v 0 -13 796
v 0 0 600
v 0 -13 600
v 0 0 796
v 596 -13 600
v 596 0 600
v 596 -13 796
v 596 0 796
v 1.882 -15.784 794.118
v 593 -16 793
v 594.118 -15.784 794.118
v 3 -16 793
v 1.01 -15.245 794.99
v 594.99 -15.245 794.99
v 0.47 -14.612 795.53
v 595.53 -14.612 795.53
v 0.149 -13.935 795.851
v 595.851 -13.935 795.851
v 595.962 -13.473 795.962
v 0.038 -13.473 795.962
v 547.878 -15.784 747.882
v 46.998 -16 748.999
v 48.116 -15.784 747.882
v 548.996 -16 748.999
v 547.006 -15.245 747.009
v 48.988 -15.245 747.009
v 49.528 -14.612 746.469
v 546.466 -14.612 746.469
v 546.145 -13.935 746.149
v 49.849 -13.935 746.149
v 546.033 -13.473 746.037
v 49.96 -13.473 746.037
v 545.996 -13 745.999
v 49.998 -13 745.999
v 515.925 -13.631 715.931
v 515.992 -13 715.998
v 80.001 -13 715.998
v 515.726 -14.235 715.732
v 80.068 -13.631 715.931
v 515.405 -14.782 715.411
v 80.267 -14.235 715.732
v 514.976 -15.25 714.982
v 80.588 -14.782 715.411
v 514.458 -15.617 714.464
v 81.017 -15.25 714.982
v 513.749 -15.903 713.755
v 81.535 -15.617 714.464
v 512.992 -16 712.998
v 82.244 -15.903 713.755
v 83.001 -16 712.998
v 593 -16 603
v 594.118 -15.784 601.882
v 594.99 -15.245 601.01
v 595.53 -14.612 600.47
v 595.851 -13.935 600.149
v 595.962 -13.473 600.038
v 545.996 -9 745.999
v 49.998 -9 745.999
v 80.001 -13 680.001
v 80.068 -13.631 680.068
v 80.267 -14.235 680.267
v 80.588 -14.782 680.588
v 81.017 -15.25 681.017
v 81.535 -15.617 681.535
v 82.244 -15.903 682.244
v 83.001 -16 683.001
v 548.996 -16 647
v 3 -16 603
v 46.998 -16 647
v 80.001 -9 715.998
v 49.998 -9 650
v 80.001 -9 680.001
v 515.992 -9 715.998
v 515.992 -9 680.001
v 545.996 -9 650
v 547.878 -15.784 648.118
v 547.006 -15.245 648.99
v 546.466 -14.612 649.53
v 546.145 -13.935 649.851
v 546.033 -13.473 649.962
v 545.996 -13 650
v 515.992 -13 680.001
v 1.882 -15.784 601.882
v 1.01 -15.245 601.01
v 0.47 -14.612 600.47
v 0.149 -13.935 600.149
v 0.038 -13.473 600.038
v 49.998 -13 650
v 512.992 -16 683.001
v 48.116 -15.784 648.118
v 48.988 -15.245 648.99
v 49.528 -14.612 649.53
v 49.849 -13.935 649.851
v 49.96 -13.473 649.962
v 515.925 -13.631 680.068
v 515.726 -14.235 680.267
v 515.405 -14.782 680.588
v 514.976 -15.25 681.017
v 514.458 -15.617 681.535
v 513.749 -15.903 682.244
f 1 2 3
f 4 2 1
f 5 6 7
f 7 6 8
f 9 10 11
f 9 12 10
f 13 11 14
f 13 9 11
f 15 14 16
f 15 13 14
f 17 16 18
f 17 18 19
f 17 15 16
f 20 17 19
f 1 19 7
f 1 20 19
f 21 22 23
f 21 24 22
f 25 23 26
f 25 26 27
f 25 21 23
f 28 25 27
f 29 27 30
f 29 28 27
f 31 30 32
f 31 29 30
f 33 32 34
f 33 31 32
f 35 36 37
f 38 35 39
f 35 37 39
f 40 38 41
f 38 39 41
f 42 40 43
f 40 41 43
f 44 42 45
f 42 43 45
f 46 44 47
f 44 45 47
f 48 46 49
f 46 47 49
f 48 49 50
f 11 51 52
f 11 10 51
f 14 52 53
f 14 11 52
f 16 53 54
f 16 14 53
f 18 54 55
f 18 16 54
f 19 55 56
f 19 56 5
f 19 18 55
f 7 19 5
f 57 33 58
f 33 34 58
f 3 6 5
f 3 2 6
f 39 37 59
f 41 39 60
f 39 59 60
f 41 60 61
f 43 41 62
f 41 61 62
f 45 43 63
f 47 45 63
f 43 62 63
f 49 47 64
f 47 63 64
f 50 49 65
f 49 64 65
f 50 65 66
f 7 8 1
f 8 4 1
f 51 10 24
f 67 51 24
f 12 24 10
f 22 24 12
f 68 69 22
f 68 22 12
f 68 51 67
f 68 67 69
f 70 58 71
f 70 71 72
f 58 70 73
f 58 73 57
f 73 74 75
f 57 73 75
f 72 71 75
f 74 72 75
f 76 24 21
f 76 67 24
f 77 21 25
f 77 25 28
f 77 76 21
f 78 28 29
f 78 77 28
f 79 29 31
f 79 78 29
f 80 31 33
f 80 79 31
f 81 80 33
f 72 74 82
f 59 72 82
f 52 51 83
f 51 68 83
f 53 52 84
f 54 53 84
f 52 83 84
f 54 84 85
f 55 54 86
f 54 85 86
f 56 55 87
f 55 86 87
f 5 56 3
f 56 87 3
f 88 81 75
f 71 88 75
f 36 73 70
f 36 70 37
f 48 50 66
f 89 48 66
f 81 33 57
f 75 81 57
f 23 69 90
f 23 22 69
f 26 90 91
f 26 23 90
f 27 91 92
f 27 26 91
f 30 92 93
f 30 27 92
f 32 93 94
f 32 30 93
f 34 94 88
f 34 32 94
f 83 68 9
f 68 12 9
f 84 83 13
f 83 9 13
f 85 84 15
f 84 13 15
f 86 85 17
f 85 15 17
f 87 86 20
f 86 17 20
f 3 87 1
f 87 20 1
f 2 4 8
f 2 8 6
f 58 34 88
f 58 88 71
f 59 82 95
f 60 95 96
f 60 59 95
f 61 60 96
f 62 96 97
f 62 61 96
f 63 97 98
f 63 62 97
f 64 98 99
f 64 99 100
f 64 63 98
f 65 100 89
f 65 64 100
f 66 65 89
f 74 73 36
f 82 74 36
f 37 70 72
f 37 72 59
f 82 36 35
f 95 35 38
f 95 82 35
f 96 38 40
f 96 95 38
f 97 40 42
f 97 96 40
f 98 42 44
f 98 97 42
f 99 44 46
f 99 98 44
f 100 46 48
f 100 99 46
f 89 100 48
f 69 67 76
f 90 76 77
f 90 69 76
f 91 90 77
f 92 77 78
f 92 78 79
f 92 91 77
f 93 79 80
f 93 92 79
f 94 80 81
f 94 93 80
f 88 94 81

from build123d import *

# Parameters (mm, degrees)
F0_W      = 44.656470418
F0_H      = 33.8078811765
F1_DEPTH  = 16
F2_DEPTH  = 796
F3_DEPTH  = 196
F4_W      = 68.9578056335
F4_H      = 493.6993122101
F5_DEPTH  = 7
F6_DEPTH  = 9.7
F7_DEPTH  = 99.33
F8_DEPTH  = 99.33
F9_DEPTH  = 17.34
F10_DEPTH = 102.97
F11_W     = 35.2807044983
F11_H     = 492.0964837074
F12_DEPTH = 7
F13_DEPTH = 37.27
F14_DEPTH = 6.58
F15_DEPTH = 106.63
F16_DEPTH = 5.87
F17_DEPTH = 200
F18_DEPTH = 200
F19_DEPTH = 200
F20_DEPTH = 200
F21_DEPTH = 200
F22_DEPTH = 200
F23_DEPTH = 600
F24_DEPTH = 600
F25_DEPTH = 600
F26_R     = 3


with BuildPart() as f1:
    # F0 (on Front) → F1 (new body)
    with BuildSketch(Plane.XZ):
        with Locations((22.328235209, 16.9039405882)):
            Rectangle(F0_W, F0_H)
    extrude(amount=F1_DEPTH)

    # F2 (add): a face of the model
    f2_faces = [f1.faces().sort_by_distance(p)[0] for p in [
        (22.328235209, -8, 0),
    ]]
    extrude(f2_faces, amount=-F2_DEPTH)

    # F3 (add): a face of the model
    f3_faces = [f1.faces().sort_by_distance(p)[0] for p in [
        (0, -8, 398),
    ]]
    extrude(f3_faces, amount=-F3_DEPTH)

    # F4 (on face) → F5 (cut)
    with BuildSketch(Plane.XZ.offset(16)):
        with Locations((94.1769480705, 399.8196721077)):
            Rectangle(F4_W, F4_H)
    extrude(amount=-F5_DEPTH, mode=Mode.SUBTRACT)

    # F6 (cut): a face of the model
    f6_faces = [f1.faces().sort_by_distance(p)[0] for p in [
        (59.6980452538, -12.5, 399.8196721077),
    ]]
    extrude(f6_faces, amount=-F6_DEPTH, mode=Mode.SUBTRACT)

    # F7 (add): a face of the model
    f7_faces = [f1.faces().sort_by_distance(p)[0] for p in [
        (89.3269480705, -12.5, 646.6693282127),
    ]]
    extrude(f7_faces, amount=-F7_DEPTH)

    # F8 (cut): a face of the model
    f8_faces = [f1.faces().sort_by_distance(p)[0] for p in [
        (89.3269480705, -12.5, 646.6693282127),
    ]]
    extrude(f8_faces, amount=-F8_DEPTH, mode=Mode.SUBTRACT)

    # F9 (cut): a face of the model
    f9_faces = [f1.faces().sort_by_distance(p)[0] for p in [
        (128.6558508873, -12.5, 449.4846721077),
    ]]
    extrude(f9_faces, amount=-F9_DEPTH, mode=Mode.SUBTRACT)

    # F10 (cut): a face of the model
    f10_faces = [f1.faces().sort_by_distance(p)[0] for p in [
        (97.9969480705, -12.5, 152.9700160027),
    ]]
    extrude(f10_faces, amount=-F10_DEPTH, mode=Mode.SUBTRACT)

    # F11 (on face) → F12 (join)
    with BuildSketch(Plane.XZ.offset(9)):
        with Locations((91.7714834213, 432.6795041561)):
            Rectangle(F11_W, F11_H)
    extrude(amount=F12_DEPTH)

    # F13 (add): a face of the model
    f13_faces = [f1.faces().sort_by_distance(p)[0] for p in [
        (91.7714834213, -12.5, 678.7277460098),
    ]]
    extrude(f13_faces, amount=F13_DEPTH)

    # F14 (add): a face of the model
    f14_faces = [f1.faces().sort_by_distance(p)[0] for p in [
        (109.4118356705, -12.5, 451.3145041561),
    ]]
    extrude(f14_faces, amount=F14_DEPTH)

    # F15 (add): a face of the model
    f15_faces = [f1.faces().sort_by_distance(p)[0] for p in [
        (95.0614834213, -12.5, 186.6312623024),
    ]]
    extrude(f15_faces, amount=F15_DEPTH)

    # F16 (cut): a face of the model
    f16_faces = [f1.faces().sort_by_distance(p)[0] for p in [
        (74.1311311722, -12.5, 397.9995041561),
    ]]
    extrude(f16_faces, amount=-F16_DEPTH, mode=Mode.SUBTRACT)

    # F17 (add): a face of the model
    f17_faces = [f1.faces().sort_by_distance(p)[0] for p in [
        (196, -8, 398),
    ]]
    extrude(f17_faces, amount=F17_DEPTH)

    # F18 (cut): a face of the model
    f18_faces = [f1.faces().sort_by_distance(p)[0] for p in [
        (145.9958508873, -12.5, 397.9996721077),
    ]]
    extrude(f18_faces, amount=-F18_DEPTH, mode=Mode.SUBTRACT)

    # F19 (add): a face of the model
    f19_faces = [f1.faces().sort_by_distance(p)[0] for p in [
        (115.9918356705, -12.5, 397.9995041561),
    ]]
    extrude(f19_faces, amount=F19_DEPTH)

    # F20 (add): a face of the model
    f20_faces = [f1.faces().sort_by_distance(p)[0] for p in [
        (396, -8, 398),
    ]]
    extrude(f20_faces, amount=F20_DEPTH)

    # F21 (cut): a face of the model
    f21_faces = [f1.faces().sort_by_distance(p)[0] for p in [
        (345.9958508873, -12.5, 397.9996721077),
    ]]
    extrude(f21_faces, amount=-F21_DEPTH, mode=Mode.SUBTRACT)

    # F22 (add): a face of the model
    f22_faces = [f1.faces().sort_by_distance(p)[0] for p in [
        (315.9918356705, -12.5, 397.9995041561),
    ]]
    extrude(f22_faces, amount=F22_DEPTH)

    # F23 (cut): a face of the model
    f23_faces = [f1.faces().sort_by_distance(p)[0] for p in [
        (297.9964834213, -12.5, 80.0012623024),
    ]]
    extrude(f23_faces, amount=-F23_DEPTH, mode=Mode.SUBTRACT)

    # F24 (add): a face of the model
    f24_faces = [f1.faces().sort_by_distance(p)[0] for p in [
        (297.9969480705, -12.5, 50.0000160027),
    ]]
    extrude(f24_faces, amount=F24_DEPTH)

    # F25 (cut): a face of the model
    f25_faces = [f1.faces().sort_by_distance(p)[0] for p in [
        (298, -8, 0),
    ]]
    extrude(f25_faces, amount=-F25_DEPTH, mode=Mode.SUBTRACT)

    # F26
    f26_edges = [f1.edges().sort_by_distance(p)[0] for p in [
        (0, -16, 698),
        (298, -16, 796),
        (596, -16, 698),
        (298, -16, 600),
        (49.998045, -16, 697.999672),
        (297.996948, -16, 650.000016),
        (297.996948, -16, 745.999328),
        (545.995851, -16, 697.999672),
        (297.996483, -16, 715.997746),
        (515.991836, -16, 697.999504),
        (297.996483, -16, 680.001262),
        (80.001131, -16, 697.999504),
    ]]
    fillet(f26_edges, radius=F26_R)


solid = f1.part
